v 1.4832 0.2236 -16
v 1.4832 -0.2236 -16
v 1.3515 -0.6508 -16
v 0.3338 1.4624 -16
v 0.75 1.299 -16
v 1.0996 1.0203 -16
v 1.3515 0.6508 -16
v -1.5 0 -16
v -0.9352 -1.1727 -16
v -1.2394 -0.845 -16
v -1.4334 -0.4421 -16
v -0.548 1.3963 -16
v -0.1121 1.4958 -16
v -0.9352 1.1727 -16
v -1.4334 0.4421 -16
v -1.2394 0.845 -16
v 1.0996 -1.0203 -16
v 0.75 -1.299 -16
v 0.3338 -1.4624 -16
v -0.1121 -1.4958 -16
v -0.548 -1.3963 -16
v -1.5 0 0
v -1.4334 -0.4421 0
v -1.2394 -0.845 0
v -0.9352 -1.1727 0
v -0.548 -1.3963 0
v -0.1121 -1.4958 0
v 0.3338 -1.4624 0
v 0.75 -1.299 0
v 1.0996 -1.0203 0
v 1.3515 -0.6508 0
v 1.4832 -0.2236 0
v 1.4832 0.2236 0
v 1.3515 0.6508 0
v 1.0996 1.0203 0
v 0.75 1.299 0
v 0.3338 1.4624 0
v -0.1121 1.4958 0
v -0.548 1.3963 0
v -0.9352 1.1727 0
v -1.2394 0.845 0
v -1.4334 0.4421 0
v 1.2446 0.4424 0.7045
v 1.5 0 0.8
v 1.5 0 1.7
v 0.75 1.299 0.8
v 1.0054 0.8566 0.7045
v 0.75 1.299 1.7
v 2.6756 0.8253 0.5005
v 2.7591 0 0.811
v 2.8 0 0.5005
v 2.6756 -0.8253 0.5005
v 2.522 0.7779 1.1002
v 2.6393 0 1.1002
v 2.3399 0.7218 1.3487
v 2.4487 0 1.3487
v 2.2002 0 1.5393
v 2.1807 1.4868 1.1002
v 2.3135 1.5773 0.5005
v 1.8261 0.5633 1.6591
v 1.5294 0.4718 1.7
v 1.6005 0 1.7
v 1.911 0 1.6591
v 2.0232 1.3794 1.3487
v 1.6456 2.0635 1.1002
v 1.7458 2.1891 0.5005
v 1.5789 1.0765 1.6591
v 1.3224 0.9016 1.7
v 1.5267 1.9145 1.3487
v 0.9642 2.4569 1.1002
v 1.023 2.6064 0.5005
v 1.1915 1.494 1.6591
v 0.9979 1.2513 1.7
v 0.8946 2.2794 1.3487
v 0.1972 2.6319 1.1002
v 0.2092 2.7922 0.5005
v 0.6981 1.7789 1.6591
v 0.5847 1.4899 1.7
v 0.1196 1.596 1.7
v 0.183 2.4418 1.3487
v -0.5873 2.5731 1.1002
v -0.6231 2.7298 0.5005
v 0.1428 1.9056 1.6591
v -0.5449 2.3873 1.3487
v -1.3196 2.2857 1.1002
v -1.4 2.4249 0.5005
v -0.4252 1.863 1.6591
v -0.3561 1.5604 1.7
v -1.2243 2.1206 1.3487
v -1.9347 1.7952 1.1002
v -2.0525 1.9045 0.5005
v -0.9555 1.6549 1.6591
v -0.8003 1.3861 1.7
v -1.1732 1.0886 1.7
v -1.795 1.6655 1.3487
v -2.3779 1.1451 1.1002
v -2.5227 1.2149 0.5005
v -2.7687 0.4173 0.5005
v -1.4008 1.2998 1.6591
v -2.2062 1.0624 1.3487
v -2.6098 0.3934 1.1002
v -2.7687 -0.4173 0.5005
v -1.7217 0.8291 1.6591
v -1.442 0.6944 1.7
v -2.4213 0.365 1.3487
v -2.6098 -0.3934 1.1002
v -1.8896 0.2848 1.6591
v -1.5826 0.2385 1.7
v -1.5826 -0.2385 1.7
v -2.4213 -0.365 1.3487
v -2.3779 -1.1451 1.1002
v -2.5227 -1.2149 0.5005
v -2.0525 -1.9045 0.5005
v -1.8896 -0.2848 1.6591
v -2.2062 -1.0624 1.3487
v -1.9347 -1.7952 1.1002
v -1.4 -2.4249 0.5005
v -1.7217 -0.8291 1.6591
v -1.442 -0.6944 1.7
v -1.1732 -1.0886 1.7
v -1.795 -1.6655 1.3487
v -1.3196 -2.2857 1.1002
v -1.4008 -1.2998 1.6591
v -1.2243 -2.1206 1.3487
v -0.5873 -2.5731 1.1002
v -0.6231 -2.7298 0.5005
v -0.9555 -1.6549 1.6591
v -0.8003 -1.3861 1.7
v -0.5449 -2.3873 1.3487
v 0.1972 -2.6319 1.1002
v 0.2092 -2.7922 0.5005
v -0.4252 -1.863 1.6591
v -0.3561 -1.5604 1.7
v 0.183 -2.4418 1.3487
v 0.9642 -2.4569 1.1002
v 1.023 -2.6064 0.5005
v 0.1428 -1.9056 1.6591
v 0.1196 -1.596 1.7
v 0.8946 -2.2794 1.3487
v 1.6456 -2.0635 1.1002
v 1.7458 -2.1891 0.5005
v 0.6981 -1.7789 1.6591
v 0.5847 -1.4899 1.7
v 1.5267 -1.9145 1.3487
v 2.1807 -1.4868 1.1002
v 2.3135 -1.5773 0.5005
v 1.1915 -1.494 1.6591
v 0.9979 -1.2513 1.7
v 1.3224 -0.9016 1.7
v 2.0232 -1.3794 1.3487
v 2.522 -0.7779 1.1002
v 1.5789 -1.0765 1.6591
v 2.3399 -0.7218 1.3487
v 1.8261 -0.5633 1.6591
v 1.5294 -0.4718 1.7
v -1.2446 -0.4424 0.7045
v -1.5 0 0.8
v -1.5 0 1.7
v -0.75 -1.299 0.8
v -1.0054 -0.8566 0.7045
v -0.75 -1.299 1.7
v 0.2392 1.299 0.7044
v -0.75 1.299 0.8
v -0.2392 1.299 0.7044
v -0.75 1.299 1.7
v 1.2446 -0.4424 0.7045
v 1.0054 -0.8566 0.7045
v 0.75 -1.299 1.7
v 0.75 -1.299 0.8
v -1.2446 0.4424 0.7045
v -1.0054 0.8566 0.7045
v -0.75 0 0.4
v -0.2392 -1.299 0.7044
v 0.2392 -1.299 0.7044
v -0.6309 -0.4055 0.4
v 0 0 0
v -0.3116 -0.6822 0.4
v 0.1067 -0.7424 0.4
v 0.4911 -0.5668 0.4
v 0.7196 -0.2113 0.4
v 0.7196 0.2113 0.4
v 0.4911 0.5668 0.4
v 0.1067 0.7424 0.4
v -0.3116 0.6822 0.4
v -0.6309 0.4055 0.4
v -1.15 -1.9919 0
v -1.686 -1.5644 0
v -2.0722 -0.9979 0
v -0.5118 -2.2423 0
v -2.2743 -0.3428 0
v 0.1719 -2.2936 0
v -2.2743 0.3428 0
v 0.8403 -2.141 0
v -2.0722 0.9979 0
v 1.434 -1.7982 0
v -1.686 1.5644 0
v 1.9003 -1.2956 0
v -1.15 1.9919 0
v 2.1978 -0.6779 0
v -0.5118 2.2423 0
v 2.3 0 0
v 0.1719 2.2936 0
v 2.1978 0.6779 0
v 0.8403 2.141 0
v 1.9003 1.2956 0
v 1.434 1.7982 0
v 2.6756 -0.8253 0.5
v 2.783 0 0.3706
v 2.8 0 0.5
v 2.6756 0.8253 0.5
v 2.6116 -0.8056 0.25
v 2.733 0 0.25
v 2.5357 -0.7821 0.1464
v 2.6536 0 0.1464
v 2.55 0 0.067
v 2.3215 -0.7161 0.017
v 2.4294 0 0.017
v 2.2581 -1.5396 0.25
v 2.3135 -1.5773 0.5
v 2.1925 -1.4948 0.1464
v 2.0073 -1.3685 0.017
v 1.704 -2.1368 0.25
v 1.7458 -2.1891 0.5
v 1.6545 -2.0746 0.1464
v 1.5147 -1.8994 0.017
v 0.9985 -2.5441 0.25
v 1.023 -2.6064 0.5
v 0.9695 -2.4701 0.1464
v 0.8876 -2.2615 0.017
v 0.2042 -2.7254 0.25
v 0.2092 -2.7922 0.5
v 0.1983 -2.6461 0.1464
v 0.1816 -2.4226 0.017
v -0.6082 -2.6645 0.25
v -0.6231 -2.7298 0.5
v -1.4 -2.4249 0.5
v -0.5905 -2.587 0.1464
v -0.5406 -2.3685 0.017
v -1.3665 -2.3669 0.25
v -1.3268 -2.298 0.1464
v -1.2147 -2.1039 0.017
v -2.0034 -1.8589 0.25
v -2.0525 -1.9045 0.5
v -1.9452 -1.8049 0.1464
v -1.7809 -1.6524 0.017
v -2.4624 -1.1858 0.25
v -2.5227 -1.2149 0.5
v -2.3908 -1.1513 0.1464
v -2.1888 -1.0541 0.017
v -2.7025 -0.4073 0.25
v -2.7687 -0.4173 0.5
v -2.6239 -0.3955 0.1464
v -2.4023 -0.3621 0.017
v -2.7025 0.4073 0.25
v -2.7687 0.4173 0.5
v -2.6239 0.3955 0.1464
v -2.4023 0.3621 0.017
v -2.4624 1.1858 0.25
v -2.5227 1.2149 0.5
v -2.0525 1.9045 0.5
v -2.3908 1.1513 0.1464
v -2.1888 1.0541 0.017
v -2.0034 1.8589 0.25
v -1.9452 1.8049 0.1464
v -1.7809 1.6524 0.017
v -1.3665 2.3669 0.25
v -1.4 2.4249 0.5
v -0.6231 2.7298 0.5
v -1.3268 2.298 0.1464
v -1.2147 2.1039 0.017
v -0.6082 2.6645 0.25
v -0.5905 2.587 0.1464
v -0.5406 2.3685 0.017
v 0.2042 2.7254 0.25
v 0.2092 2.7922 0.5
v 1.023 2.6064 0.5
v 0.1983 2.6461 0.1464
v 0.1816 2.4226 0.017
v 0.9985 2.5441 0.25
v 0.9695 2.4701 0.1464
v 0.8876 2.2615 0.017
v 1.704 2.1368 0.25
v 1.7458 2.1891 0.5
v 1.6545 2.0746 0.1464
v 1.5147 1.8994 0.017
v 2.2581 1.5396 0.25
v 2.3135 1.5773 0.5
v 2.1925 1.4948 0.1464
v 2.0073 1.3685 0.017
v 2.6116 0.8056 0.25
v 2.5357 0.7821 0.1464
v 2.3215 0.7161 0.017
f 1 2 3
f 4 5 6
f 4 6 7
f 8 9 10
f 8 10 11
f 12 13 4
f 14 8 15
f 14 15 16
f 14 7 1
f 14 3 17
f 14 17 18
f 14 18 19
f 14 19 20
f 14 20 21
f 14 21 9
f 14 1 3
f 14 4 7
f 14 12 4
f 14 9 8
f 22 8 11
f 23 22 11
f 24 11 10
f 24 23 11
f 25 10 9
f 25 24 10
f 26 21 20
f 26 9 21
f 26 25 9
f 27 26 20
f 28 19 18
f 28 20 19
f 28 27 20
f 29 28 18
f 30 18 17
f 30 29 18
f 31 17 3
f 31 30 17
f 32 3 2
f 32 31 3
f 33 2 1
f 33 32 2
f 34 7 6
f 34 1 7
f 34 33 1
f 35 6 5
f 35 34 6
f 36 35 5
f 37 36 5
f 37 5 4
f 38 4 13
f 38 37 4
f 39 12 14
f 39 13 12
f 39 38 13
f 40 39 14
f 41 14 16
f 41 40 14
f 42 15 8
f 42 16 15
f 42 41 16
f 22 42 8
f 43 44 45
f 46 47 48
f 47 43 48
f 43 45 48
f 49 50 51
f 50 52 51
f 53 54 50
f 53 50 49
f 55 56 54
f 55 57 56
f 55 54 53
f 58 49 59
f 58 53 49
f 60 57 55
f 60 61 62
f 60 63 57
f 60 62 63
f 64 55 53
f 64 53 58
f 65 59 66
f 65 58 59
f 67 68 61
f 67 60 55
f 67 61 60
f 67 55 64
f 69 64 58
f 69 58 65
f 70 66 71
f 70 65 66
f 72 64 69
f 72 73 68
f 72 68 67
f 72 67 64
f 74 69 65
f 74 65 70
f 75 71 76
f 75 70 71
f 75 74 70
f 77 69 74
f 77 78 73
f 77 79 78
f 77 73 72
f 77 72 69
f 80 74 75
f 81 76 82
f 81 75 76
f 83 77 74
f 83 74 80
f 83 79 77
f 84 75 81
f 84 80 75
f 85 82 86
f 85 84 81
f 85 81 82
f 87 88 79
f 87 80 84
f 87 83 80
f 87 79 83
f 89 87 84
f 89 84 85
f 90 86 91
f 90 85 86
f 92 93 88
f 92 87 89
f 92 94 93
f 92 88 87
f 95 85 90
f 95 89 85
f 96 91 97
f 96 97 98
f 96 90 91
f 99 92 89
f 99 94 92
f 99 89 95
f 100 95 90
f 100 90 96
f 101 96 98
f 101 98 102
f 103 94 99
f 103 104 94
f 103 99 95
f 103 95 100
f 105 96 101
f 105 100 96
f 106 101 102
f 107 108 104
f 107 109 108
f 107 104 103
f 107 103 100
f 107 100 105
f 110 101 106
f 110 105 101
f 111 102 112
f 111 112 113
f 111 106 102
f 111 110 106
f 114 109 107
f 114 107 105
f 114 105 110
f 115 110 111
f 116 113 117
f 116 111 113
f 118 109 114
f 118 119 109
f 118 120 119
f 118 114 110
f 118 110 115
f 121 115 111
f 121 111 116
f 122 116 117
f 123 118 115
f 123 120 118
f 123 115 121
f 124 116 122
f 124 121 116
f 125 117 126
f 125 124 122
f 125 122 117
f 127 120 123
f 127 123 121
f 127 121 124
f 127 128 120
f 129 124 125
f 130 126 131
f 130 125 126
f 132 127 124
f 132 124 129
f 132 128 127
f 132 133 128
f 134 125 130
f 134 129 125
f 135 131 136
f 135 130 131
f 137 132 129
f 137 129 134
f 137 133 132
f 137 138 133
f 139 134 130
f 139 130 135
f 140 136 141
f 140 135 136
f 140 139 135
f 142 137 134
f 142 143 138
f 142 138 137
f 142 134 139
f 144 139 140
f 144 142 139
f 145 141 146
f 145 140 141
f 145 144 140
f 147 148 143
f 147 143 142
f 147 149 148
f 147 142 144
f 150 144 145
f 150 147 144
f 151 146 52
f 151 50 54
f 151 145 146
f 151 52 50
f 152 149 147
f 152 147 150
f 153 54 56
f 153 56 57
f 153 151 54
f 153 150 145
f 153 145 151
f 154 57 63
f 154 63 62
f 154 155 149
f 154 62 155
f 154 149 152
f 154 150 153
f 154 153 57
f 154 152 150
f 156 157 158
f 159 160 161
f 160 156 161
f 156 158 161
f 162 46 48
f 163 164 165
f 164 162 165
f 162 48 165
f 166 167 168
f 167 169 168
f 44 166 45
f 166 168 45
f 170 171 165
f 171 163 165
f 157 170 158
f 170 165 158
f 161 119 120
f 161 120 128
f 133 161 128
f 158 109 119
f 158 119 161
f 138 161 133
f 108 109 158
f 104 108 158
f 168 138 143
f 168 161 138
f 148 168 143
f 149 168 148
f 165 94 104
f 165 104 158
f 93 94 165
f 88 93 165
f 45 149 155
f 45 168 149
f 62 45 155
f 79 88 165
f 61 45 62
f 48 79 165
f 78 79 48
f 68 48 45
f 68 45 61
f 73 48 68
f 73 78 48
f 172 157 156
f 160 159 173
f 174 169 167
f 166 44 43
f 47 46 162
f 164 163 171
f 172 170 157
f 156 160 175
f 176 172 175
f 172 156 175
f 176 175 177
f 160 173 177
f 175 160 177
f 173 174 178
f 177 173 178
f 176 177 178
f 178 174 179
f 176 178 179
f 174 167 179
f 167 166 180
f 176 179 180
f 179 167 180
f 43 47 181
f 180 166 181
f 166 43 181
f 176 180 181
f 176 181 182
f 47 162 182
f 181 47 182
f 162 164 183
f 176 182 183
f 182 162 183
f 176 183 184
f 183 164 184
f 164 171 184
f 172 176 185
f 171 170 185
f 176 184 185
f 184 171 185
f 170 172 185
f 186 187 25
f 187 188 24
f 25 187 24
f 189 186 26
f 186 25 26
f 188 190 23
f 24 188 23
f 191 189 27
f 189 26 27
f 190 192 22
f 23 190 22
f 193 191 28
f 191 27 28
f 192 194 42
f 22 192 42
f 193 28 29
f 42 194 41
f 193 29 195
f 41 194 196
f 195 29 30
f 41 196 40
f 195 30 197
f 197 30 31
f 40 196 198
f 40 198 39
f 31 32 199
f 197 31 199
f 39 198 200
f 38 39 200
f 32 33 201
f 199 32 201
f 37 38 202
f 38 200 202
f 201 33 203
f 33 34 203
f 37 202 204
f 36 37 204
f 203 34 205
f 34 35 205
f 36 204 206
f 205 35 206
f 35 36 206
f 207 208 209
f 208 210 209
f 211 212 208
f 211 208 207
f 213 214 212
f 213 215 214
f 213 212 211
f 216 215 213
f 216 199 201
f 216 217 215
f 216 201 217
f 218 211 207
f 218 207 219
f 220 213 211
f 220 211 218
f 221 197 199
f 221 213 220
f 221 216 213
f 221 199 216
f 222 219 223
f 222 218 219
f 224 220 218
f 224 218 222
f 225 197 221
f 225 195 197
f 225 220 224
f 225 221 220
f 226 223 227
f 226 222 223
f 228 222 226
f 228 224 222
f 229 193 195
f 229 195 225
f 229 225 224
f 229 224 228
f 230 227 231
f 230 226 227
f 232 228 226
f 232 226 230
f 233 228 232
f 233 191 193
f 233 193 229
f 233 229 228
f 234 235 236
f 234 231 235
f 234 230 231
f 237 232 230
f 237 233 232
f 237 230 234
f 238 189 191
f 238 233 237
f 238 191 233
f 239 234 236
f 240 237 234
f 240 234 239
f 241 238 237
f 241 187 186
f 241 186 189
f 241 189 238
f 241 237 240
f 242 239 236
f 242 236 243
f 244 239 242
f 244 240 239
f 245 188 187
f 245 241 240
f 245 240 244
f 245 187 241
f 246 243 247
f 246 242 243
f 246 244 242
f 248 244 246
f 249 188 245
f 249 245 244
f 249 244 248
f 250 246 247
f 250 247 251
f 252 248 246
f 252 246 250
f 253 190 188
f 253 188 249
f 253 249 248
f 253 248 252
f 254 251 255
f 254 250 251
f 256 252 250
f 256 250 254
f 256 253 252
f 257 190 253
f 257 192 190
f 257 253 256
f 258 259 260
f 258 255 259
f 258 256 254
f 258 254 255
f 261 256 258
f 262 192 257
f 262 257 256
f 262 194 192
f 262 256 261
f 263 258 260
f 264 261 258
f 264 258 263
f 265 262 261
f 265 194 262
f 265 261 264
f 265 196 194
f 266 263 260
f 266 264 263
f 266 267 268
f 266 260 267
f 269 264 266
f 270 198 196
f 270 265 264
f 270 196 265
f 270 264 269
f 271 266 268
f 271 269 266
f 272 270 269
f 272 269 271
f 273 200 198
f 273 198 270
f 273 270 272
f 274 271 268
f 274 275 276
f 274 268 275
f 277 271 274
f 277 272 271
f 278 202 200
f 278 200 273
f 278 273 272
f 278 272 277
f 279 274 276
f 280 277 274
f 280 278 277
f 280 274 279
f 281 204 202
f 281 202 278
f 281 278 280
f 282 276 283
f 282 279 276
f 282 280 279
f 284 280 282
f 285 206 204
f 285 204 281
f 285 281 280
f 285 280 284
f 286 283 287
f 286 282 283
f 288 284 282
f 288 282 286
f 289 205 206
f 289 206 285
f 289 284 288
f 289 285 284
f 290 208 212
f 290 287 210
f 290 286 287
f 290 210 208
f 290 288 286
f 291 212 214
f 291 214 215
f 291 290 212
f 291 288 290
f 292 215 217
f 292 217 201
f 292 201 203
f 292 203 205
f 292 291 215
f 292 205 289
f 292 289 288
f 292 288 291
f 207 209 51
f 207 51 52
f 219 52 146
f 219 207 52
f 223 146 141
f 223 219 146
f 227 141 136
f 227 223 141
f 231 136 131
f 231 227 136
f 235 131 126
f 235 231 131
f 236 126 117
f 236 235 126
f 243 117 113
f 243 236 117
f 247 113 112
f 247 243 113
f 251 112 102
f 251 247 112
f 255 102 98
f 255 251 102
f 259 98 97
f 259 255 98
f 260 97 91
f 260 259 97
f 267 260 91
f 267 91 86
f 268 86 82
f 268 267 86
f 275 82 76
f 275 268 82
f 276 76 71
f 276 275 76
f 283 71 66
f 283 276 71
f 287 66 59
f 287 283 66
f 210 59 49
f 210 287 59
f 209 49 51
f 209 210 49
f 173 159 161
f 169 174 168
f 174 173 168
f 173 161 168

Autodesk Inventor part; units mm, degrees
ref_plane "YZ Plane" through (0, 0, 0) normal (1, 0, 0) x (0, 1, 0)
ref_plane "XZ Plane" through (0, 0, 0) normal (0, 1, 0) x (-1, 0, 0)
ref_plane "XY Plane" through (0, 0, 0) normal (0, 0, 1) x (1, 0, 0)
sketch "Sketch1" plane through (0, 0, 0) normal (0, 0, 1) x (1, 0, 0)
  circle A0 centre (0, 0) radius 2.8
  dimension "d0" = 5.6
extrude "Extrusion1" add sketch "Sketch1" along normal blind 1.7
fillet "Fillet3" radius 0.5 1 edges at (-2.8, 0, 0)
fillet "Fillet4" radius 1.2 1 edges at (-2.8, 0, 1.7)
sketch "Sketch2" plane through (0, 0, 1.7) normal (0, 0, 1) x (1, 0, 0)
  line L0 (-0.75, -1.299) -> (0.75, -1.299)
  line L1 (0.75, -1.299) -> (1.5, 0)
  line L2 (1.5, 0) -> (0.75, 1.299)
  line L3 (0.75, 1.299) -> (-0.75, 1.299)
  line L4 (-0.75, 1.299) -> (-1.5, 0)
  line L5 (-1.5, 0) -> (-0.75, -1.299)
  dimension "d7" = 3
extrude "Extrusion2" cut sketch "Sketch2" against normal blind 1.7
sketch "Sketch3" plane through (0, 0, 0) normal (0, 1, 0) x (-1, 0, 0)
  line L0 (0, 0) -> (1.5, 0)
  line L1 (2.3, 0) -> (-2.3, 0) projected
  line L2 (1.5, 0) -> (1.5, 0.8)
  line L3 (1.5, 0.8) -> (0, 0)
  line L4 (0, 0) -> (0, 2.432)
  dimension "d13" = 0
  dimension "d14" = 1.5
  dimension "d15" = 0.8
revolve "Revolution2" add sketch "Sketch3" angle 360 about axis through (0, 0, 0) along (0, 0, 1)
sketch "Sketch4" plane through (0, 0, 0) normal (0, 0, -1) x (-1, 0, 0)
  circle A0 centre (0, 0) radius 2.3 projected
  circle A1 centre (0, 0) radius 1.5
  dimension "d18" = 3
extrude "Extrusion3" add sketch "Sketch4" along normal blind 16 contours A1
thread "Thread1" size "M3x0.5" class "6g" standard "ANSI Metric M Profile" full length
properties part number "screw_M3_16_hex"
